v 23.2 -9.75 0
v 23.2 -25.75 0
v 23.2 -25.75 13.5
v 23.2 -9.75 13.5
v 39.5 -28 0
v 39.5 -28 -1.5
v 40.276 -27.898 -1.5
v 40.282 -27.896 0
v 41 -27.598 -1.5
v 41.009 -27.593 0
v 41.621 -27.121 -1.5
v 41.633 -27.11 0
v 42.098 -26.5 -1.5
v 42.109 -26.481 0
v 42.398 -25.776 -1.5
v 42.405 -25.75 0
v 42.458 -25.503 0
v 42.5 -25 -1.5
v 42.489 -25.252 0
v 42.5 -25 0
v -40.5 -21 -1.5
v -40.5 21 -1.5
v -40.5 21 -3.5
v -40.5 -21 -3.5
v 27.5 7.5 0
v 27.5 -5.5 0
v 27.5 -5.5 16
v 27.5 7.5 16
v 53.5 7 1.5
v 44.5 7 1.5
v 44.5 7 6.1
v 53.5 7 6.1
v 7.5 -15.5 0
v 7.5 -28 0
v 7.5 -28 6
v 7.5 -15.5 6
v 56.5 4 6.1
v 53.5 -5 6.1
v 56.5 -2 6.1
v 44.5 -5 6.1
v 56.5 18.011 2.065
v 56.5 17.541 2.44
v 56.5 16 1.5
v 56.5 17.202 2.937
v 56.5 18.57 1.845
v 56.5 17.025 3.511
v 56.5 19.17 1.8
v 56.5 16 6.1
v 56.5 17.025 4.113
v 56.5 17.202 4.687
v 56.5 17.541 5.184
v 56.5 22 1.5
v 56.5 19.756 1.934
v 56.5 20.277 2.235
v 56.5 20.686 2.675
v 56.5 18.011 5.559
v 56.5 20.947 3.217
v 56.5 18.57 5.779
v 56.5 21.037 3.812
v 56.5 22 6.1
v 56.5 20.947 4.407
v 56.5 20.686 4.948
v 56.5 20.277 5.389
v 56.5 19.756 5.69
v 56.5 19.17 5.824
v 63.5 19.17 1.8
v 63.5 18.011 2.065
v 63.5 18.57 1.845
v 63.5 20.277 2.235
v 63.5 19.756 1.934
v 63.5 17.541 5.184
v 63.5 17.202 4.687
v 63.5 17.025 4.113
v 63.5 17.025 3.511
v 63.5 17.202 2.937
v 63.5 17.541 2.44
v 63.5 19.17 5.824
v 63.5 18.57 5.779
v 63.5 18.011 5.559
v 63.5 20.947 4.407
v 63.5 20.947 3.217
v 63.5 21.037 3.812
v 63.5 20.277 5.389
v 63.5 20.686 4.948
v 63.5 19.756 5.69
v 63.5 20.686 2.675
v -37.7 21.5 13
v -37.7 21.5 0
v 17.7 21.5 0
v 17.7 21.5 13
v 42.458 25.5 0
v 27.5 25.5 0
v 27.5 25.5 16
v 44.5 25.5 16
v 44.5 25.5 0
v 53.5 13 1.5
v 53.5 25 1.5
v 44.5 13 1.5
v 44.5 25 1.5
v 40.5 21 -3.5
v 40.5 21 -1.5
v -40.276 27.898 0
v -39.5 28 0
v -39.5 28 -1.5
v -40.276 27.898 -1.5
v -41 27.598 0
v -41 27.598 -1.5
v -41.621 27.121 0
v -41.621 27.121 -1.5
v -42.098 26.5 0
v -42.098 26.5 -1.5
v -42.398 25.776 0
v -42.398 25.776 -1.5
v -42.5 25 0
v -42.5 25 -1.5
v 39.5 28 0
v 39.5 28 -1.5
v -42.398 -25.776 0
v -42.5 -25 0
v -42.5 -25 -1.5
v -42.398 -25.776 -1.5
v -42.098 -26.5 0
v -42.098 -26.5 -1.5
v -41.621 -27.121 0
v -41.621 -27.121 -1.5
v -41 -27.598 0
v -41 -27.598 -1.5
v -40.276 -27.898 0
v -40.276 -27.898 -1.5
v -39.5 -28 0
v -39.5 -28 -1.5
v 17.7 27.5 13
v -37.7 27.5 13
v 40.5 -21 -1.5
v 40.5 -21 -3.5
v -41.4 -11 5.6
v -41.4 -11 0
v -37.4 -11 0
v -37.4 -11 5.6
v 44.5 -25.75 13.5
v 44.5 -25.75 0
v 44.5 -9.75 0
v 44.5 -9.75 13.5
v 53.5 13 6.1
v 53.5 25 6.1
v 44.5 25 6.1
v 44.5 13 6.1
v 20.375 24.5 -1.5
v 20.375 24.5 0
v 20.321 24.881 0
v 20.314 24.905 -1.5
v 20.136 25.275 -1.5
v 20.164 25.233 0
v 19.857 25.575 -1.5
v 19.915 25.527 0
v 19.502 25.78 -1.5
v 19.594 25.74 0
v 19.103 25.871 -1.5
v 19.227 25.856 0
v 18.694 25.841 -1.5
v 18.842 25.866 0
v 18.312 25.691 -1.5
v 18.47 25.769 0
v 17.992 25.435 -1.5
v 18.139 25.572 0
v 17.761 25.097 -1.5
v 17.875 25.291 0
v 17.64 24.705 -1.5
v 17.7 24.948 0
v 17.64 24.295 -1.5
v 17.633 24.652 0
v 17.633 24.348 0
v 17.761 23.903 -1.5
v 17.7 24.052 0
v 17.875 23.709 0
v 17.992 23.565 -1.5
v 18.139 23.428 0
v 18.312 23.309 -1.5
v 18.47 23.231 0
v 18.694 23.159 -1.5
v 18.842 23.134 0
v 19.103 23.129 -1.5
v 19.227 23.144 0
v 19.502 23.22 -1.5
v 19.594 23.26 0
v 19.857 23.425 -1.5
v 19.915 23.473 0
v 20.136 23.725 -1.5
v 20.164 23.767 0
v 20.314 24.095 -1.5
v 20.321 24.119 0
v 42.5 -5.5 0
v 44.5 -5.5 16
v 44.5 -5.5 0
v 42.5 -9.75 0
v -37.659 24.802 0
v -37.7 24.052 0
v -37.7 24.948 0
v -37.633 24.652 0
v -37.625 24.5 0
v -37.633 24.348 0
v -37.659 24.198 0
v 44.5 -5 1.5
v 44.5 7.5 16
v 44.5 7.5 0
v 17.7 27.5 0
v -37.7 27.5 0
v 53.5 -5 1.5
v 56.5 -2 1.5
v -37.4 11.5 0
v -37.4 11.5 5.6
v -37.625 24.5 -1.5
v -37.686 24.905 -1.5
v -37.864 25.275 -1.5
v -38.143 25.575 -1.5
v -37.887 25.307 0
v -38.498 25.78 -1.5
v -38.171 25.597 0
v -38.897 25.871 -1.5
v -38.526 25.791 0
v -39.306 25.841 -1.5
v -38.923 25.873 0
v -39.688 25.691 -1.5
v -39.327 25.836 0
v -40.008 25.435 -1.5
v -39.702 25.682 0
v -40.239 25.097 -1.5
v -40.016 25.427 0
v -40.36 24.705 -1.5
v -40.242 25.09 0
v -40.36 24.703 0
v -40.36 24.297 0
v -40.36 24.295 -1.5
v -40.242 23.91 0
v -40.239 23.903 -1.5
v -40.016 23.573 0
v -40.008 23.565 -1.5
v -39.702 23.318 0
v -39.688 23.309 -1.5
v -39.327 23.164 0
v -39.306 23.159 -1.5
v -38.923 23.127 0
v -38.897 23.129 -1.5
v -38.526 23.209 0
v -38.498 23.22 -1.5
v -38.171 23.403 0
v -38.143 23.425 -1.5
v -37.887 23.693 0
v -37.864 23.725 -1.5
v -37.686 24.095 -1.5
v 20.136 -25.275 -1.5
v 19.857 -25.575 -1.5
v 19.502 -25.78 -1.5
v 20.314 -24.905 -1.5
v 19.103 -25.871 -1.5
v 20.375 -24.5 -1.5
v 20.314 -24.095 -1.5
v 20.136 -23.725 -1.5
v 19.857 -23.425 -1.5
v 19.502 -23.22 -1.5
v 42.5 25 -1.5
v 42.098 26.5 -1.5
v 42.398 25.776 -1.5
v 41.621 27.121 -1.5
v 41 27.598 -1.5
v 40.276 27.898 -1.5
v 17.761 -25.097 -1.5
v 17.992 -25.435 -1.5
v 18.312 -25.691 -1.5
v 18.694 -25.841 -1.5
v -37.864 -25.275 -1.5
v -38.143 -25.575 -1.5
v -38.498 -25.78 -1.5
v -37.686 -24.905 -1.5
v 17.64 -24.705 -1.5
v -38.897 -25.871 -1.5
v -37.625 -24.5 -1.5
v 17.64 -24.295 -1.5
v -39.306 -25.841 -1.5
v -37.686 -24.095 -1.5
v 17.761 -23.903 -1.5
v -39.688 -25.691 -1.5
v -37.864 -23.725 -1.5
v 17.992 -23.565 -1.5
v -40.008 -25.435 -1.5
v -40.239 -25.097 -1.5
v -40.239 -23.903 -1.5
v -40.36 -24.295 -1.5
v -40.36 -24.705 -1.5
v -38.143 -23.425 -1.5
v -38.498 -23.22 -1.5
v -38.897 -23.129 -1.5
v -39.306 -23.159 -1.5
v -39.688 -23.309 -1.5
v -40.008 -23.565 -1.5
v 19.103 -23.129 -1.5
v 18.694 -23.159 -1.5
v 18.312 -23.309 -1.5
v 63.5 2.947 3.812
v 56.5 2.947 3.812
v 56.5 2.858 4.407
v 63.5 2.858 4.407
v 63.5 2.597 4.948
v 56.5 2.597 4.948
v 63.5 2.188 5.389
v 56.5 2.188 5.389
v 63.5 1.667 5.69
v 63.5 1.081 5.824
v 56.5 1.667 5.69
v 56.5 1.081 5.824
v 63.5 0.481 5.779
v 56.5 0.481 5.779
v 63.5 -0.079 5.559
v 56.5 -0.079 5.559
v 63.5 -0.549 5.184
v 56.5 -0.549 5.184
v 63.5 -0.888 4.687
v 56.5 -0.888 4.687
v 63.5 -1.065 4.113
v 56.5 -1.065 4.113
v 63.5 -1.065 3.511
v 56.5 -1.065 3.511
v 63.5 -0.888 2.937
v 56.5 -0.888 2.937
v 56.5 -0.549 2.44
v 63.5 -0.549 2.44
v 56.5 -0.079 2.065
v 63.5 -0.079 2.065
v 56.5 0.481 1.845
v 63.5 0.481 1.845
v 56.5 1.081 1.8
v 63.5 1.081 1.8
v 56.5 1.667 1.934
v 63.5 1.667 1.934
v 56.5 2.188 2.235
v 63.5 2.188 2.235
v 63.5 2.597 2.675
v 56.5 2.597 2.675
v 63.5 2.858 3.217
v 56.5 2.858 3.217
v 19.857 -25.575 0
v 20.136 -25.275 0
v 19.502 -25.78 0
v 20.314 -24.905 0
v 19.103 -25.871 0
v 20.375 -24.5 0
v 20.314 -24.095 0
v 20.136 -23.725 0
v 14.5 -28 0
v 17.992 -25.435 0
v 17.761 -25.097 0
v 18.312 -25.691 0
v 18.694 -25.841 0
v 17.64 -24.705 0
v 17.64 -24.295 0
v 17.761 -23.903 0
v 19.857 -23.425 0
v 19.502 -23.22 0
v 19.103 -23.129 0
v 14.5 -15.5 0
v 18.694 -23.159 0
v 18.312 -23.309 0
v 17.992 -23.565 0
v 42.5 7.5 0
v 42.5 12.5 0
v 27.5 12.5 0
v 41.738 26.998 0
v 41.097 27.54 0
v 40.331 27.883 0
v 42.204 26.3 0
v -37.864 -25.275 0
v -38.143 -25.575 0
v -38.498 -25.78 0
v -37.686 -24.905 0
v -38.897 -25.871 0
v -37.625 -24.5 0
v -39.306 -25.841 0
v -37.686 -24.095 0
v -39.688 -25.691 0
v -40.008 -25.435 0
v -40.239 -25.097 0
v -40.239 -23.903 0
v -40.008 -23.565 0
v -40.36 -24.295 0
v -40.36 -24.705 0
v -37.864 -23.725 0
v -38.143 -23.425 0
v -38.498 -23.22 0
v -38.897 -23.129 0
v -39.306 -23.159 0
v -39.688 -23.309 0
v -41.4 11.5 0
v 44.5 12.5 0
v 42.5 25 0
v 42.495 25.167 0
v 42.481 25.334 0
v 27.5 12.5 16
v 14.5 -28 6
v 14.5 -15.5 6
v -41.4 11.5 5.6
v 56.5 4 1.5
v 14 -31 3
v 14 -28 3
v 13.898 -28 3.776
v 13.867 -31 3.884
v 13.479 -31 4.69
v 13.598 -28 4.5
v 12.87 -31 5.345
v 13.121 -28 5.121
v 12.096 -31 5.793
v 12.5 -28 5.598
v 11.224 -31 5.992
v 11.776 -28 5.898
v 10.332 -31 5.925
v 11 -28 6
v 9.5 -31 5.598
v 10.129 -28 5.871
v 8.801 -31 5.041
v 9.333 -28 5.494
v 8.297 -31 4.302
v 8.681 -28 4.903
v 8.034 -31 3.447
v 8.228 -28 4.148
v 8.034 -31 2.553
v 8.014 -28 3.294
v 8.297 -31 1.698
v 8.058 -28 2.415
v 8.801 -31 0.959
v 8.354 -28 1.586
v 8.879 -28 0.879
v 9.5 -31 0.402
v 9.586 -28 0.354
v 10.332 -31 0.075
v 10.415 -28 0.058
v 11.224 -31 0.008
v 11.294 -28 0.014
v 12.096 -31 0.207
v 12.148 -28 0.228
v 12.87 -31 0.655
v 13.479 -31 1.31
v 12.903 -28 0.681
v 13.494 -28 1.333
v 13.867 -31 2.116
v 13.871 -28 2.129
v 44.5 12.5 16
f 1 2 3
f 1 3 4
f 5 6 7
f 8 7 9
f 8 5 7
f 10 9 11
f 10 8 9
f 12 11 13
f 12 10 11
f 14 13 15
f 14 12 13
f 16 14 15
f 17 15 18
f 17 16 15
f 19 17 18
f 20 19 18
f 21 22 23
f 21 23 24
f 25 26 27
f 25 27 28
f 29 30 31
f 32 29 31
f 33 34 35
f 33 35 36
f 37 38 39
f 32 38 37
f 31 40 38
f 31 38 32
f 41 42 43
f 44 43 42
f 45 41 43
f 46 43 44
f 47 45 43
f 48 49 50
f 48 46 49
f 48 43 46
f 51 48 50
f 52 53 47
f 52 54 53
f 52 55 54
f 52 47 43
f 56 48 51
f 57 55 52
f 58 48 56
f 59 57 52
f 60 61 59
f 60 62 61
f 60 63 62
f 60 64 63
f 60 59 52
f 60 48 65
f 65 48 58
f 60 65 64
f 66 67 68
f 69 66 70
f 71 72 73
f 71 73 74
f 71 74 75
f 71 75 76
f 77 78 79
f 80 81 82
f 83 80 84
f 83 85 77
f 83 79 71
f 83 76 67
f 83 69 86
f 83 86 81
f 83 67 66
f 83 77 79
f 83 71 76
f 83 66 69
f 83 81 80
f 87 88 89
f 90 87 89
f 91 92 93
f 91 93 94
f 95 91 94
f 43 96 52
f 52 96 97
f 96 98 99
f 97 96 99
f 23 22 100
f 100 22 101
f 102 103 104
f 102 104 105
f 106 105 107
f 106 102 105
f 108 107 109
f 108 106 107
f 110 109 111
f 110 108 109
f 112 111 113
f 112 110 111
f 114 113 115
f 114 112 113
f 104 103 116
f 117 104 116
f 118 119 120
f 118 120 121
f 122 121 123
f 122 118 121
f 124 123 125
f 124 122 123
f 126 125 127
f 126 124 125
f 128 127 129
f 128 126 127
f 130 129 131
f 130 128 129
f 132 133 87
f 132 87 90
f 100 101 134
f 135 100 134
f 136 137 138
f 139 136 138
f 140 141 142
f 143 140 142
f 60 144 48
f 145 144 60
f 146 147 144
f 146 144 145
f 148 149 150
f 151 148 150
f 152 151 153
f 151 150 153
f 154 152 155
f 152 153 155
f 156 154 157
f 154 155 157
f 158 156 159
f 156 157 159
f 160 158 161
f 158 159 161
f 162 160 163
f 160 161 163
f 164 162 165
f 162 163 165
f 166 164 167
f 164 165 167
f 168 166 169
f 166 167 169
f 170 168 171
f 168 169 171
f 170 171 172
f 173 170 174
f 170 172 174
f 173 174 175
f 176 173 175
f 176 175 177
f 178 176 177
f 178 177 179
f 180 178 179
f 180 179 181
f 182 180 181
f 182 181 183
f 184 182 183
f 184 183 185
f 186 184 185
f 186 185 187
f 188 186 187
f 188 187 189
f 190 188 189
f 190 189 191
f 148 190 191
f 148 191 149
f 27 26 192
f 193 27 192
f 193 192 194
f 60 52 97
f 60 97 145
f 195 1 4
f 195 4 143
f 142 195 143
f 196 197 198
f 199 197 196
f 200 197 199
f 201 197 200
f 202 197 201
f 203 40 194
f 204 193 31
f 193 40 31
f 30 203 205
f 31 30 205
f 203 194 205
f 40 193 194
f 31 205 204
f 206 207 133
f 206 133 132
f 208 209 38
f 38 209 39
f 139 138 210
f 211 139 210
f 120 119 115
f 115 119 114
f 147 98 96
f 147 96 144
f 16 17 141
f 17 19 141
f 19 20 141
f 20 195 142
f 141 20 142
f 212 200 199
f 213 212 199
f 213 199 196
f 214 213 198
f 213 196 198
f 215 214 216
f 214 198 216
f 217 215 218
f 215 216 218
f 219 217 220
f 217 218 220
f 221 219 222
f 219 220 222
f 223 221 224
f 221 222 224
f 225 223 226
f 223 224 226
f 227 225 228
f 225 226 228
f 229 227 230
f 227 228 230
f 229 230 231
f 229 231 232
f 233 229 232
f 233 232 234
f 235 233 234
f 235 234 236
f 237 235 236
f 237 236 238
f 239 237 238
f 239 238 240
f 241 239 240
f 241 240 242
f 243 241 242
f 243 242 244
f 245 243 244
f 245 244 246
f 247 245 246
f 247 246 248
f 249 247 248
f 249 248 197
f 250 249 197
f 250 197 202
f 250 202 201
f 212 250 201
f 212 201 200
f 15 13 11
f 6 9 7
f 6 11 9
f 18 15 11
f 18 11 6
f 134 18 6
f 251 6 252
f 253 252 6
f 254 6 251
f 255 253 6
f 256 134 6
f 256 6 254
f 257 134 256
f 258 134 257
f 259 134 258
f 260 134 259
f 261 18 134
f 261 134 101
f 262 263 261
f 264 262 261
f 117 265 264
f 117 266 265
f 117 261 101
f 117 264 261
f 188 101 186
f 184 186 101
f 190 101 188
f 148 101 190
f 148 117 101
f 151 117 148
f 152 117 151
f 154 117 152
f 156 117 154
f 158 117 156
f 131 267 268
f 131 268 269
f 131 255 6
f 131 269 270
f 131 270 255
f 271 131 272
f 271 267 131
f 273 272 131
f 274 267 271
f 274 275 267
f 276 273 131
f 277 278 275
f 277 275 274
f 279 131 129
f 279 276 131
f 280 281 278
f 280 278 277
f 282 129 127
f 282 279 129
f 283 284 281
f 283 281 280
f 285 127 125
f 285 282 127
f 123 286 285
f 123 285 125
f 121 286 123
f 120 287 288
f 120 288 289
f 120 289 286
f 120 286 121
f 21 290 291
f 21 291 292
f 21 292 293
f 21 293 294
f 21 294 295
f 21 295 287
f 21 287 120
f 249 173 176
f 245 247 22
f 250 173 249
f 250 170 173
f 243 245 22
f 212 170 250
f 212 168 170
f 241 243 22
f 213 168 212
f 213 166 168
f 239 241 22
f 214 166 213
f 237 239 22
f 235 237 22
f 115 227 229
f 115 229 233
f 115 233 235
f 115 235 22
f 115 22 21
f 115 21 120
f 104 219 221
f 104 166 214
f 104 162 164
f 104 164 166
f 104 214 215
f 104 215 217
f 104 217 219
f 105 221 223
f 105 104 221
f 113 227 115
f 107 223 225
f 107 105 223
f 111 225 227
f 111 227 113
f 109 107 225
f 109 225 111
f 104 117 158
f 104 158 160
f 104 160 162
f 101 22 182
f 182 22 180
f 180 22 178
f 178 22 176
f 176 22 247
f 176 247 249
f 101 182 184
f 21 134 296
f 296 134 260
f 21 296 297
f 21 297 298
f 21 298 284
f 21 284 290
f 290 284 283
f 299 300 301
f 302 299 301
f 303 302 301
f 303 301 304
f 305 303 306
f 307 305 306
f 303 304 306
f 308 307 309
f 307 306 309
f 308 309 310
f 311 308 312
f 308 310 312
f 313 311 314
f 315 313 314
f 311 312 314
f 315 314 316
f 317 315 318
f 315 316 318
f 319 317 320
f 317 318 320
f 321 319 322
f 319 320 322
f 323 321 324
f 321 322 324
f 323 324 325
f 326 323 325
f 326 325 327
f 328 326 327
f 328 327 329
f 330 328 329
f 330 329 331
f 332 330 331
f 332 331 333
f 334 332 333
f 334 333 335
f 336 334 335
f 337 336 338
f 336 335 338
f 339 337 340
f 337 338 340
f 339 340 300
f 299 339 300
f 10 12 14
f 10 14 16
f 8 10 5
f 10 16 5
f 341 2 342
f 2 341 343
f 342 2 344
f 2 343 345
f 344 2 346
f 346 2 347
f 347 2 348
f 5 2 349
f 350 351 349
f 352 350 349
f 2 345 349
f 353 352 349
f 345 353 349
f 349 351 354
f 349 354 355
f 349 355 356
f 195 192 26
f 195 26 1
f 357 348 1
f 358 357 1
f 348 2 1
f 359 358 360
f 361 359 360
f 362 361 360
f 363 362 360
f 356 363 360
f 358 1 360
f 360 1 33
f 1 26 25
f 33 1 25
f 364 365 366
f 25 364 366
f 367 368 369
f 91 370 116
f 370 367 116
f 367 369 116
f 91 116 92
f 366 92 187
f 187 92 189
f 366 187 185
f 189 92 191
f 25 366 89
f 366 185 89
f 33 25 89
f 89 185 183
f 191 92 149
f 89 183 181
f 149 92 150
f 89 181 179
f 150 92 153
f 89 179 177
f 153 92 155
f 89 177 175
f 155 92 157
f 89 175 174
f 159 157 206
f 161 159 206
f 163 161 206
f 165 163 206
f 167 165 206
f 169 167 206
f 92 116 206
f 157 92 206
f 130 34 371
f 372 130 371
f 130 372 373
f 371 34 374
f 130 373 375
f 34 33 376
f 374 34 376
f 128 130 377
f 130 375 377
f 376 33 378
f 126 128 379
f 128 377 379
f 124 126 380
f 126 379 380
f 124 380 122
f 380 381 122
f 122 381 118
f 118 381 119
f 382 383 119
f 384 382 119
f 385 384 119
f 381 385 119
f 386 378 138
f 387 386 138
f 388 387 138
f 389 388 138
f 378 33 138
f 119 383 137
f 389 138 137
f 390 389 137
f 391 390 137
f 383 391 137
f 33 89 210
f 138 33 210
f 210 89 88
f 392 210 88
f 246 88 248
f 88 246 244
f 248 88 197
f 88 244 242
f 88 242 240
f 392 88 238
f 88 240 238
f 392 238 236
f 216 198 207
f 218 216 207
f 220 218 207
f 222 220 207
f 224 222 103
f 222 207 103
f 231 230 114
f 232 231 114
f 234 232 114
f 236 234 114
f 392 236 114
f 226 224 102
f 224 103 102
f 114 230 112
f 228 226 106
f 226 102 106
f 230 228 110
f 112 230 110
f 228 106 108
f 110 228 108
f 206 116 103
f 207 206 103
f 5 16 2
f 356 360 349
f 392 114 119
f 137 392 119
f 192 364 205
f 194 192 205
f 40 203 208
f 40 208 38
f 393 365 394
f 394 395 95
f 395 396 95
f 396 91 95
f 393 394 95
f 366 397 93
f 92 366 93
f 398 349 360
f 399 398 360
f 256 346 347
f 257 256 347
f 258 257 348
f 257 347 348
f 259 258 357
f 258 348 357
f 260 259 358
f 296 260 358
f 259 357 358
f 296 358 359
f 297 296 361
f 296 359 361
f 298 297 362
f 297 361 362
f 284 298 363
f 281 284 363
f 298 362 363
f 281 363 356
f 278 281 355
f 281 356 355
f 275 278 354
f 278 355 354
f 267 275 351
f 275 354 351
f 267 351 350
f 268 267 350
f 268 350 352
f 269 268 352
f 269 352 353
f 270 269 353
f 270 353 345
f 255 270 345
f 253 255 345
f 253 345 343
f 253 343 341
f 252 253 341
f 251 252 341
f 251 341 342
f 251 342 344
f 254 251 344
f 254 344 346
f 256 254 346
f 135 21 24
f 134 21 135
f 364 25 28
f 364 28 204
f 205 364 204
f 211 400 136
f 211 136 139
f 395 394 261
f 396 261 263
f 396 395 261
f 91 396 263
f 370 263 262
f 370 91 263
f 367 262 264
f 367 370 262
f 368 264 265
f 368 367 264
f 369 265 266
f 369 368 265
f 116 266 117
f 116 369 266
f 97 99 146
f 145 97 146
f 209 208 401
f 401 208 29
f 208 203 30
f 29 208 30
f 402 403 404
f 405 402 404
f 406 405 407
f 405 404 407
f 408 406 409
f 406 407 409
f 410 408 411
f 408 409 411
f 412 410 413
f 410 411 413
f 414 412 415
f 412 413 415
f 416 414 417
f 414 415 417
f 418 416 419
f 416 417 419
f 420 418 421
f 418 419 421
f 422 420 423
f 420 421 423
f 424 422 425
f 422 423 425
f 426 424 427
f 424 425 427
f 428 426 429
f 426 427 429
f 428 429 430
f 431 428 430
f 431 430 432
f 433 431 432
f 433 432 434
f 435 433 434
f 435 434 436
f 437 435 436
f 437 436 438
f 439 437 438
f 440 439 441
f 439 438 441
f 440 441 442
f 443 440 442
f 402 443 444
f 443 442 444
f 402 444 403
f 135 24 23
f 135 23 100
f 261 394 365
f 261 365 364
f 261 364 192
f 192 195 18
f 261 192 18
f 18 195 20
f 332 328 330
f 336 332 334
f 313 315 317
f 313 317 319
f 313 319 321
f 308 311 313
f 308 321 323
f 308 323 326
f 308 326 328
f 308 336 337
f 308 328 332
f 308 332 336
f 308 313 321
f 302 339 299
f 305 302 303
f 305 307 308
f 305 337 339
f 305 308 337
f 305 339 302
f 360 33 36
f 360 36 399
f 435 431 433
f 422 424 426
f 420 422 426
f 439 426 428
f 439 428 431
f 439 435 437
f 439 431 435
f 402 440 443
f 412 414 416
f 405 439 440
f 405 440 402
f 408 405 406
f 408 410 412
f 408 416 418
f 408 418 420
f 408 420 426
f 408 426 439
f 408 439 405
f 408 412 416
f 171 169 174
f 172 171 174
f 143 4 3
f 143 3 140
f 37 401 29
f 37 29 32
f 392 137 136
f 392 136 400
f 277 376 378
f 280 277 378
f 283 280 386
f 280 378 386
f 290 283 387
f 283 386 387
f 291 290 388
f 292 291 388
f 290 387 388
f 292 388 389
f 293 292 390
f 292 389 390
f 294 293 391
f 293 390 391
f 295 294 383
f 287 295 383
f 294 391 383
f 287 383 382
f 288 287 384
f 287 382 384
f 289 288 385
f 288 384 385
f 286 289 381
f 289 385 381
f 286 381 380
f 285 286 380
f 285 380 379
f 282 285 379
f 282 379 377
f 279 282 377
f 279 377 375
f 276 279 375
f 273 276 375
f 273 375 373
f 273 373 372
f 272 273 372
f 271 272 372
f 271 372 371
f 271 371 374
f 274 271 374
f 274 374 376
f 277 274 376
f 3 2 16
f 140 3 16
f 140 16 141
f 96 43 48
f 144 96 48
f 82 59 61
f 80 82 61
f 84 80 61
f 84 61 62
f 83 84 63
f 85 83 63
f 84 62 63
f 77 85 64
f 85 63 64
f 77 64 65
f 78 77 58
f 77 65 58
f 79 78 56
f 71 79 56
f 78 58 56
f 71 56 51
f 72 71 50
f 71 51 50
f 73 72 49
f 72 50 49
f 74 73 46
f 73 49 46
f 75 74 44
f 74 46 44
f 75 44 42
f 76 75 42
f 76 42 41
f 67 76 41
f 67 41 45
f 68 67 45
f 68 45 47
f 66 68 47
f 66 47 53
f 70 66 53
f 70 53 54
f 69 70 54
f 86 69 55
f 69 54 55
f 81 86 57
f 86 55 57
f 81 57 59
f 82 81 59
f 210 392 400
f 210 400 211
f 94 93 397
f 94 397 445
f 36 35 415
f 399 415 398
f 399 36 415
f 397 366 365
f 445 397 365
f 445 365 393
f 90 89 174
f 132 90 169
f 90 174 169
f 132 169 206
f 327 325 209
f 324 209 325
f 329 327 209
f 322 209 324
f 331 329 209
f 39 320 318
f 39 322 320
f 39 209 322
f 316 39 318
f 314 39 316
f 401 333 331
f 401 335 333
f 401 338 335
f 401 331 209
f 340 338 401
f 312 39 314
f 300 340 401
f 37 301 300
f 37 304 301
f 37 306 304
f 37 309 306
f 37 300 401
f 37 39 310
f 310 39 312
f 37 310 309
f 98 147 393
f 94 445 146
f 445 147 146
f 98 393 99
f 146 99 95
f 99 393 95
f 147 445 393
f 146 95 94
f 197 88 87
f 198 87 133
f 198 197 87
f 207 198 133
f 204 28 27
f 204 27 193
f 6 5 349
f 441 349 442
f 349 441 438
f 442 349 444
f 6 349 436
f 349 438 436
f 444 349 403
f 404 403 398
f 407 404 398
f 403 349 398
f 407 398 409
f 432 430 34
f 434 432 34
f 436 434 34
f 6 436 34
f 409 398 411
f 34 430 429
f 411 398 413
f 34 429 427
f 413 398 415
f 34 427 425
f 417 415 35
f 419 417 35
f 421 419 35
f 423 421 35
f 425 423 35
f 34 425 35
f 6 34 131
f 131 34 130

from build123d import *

# Parameters (mm, degrees)
PAD_DEPTH    = 1.5
SKETCH001_R  = 1.375
POCKET_DEPTH = 1.501
SKETCH002_W  = 17
SKETCH002_H  = 13
PAD001_DEPTH = 16
SKETCH003_W  = 21.3
SKETCH003_H  = 16
PAD002_DEPTH = 13.5
SKETCH004_W  = 81
SKETCH004_H  = 42
PAD003_DEPTH = 2
SKETCH005_W  = 55.4
SKETCH005_H  = 6
PAD004_DEPTH = 13
SKETCH006_W  = 7
SKETCH006_H  = 12.5
PAD005_DEPTH = 6
SKETCH007_R  = 3
PAD006_DEPTH = 3
SKETCH008_W  = 4
SKETCH008_H  = 22.5
PAD007_DEPTH = 5.6
SKETCH009_W  = 12
SKETCH009_H  = 4.6
PAD008_DEPTH = 12
CHAMFER_SIZE = 3
SKETCH010_R  = 2.017401
PAD009_DEPTH = 7


with BuildPart() as part:
    # Sketch → Pad (new body)
    with BuildSketch(Plane.XY):
        with BuildLine():
            Line((-39.5, 28), (39.5, 28))
            ThreePointArc((42.5, 25), (41.62132, 27.12132), (39.5, 28))
            Line((42.5, 25), (42.5, -25))
            ThreePointArc((39.5, -28), (41.62132, -27.12132), (42.5, -25))
            Line((39.5, -28), (-39.5, -28))
            ThreePointArc((-42.5, -25), (-41.62132, -27.12132), (-39.5, -28))
            Line((-42.5, -25), (-42.5, 25))
            ThreePointArc((-39.5, 28), (-41.62132, 27.12132), (-42.5, 25))
        make_face()
    extrude(amount=-PAD_DEPTH)

    # Sketch001 (on Face9 of Pad) → Pocket (cut, through all)
    with BuildSketch(Plane.XY):
        with Locations((-39, 24.5)):
            Circle(SKETCH001_R)
        with Locations((19, 24.5)):
            Circle(SKETCH001_R)
        with Locations((19, -24.5)):
            Circle(SKETCH001_R)
        with Locations((-39, -24.5)):
            Circle(SKETCH001_R)
    extrude(amount=-POCKET_DEPTH, mode=Mode.SUBTRACT)

    # Sketch002 (on Face4 of Pocket) → Pad001 (join)
    with BuildSketch(Plane.XY):
        with Locations((36, 19)):
            Rectangle(SKETCH002_W, SKETCH002_H)
        with Locations((36, 1)):
            Rectangle(SKETCH002_W, SKETCH002_H)
    extrude(amount=PAD001_DEPTH)

    # Sketch003 (on Face4 of Pad001) → Pad002 (join)
    with BuildSketch(Plane.XY):
        with Locations((33.85, -17.75)):
            Rectangle(SKETCH003_W, SKETCH003_H)
    extrude(amount=PAD002_DEPTH)

    # Sketch004 (on Face5 of Pad002) → Pad003 (join)
    with BuildSketch(Plane(origin=(0, 0, -1.5), x_dir=(1, 0, 0), z_dir=(0, 0, -1))):
        Rectangle(SKETCH004_W, SKETCH004_H)
    extrude(amount=PAD003_DEPTH)

    # Sketch005 (on Face4 of Pad003) → Pad004 (join)
    with BuildSketch(Plane.XY):
        with Locations((-10, 24.5)):
            Rectangle(SKETCH005_W, SKETCH005_H)
    extrude(amount=PAD004_DEPTH)

    # Sketch006 (on Face4 of Pad004) → Pad005 (join)
    with BuildSketch(Plane.XY):
        with Locations((11, -21.75)):
            Rectangle(SKETCH006_W, SKETCH006_H)
    extrude(amount=PAD005_DEPTH)

    # Sketch007 (on Face35 of Pad005) → Pad006 (join)
    with BuildSketch(Plane.XZ.offset(28)):
        with Locations((11, 3)):
            Circle(SKETCH007_R)
    extrude(amount=PAD006_DEPTH)

    # Sketch008 (on Face4 of Pad006) → Pad007 (join)
    with BuildSketch(Plane.XY):
        with Locations((-39.4, 0.25)):
            Rectangle(SKETCH008_W, SKETCH008_H)
    extrude(amount=PAD007_DEPTH)

    # Sketch009 (on Face50 of Pad007) → Pad008 (join)
    with BuildSketch(Plane.YZ.offset(44.5)):
        with Locations((1, 3.8)):
            Rectangle(SKETCH009_W, SKETCH009_H)
        with Locations((19, 3.8)):
            Rectangle(SKETCH009_W, SKETCH009_H)
    extrude(amount=PAD008_DEPTH)

    # Chamfer
    chamfer_edges = [part.edges().sort_by_distance(p)[0] for p in [
        (56.5, 13, 3.8),
        (14, -29.5, 3),
        (56.5, 7, 3.8),
        (56.5, -5, 3.8),
        (56.5, 25, 3.8),
    ]]
    chamfer(chamfer_edges, length=CHAMFER_SIZE)

    # Sketch010 (on Face8 of Chamfer) → Pad009 (join)
    with BuildSketch(Plane.YZ.offset(56.5)):
        with Locations((0.930018, 3.811911)):
            Circle(SKETCH010_R)
        with Locations((19.019375, 3.811911)):
            Circle(SKETCH010_R)
    extrude(amount=PAD009_DEPTH)


solid = part.part
